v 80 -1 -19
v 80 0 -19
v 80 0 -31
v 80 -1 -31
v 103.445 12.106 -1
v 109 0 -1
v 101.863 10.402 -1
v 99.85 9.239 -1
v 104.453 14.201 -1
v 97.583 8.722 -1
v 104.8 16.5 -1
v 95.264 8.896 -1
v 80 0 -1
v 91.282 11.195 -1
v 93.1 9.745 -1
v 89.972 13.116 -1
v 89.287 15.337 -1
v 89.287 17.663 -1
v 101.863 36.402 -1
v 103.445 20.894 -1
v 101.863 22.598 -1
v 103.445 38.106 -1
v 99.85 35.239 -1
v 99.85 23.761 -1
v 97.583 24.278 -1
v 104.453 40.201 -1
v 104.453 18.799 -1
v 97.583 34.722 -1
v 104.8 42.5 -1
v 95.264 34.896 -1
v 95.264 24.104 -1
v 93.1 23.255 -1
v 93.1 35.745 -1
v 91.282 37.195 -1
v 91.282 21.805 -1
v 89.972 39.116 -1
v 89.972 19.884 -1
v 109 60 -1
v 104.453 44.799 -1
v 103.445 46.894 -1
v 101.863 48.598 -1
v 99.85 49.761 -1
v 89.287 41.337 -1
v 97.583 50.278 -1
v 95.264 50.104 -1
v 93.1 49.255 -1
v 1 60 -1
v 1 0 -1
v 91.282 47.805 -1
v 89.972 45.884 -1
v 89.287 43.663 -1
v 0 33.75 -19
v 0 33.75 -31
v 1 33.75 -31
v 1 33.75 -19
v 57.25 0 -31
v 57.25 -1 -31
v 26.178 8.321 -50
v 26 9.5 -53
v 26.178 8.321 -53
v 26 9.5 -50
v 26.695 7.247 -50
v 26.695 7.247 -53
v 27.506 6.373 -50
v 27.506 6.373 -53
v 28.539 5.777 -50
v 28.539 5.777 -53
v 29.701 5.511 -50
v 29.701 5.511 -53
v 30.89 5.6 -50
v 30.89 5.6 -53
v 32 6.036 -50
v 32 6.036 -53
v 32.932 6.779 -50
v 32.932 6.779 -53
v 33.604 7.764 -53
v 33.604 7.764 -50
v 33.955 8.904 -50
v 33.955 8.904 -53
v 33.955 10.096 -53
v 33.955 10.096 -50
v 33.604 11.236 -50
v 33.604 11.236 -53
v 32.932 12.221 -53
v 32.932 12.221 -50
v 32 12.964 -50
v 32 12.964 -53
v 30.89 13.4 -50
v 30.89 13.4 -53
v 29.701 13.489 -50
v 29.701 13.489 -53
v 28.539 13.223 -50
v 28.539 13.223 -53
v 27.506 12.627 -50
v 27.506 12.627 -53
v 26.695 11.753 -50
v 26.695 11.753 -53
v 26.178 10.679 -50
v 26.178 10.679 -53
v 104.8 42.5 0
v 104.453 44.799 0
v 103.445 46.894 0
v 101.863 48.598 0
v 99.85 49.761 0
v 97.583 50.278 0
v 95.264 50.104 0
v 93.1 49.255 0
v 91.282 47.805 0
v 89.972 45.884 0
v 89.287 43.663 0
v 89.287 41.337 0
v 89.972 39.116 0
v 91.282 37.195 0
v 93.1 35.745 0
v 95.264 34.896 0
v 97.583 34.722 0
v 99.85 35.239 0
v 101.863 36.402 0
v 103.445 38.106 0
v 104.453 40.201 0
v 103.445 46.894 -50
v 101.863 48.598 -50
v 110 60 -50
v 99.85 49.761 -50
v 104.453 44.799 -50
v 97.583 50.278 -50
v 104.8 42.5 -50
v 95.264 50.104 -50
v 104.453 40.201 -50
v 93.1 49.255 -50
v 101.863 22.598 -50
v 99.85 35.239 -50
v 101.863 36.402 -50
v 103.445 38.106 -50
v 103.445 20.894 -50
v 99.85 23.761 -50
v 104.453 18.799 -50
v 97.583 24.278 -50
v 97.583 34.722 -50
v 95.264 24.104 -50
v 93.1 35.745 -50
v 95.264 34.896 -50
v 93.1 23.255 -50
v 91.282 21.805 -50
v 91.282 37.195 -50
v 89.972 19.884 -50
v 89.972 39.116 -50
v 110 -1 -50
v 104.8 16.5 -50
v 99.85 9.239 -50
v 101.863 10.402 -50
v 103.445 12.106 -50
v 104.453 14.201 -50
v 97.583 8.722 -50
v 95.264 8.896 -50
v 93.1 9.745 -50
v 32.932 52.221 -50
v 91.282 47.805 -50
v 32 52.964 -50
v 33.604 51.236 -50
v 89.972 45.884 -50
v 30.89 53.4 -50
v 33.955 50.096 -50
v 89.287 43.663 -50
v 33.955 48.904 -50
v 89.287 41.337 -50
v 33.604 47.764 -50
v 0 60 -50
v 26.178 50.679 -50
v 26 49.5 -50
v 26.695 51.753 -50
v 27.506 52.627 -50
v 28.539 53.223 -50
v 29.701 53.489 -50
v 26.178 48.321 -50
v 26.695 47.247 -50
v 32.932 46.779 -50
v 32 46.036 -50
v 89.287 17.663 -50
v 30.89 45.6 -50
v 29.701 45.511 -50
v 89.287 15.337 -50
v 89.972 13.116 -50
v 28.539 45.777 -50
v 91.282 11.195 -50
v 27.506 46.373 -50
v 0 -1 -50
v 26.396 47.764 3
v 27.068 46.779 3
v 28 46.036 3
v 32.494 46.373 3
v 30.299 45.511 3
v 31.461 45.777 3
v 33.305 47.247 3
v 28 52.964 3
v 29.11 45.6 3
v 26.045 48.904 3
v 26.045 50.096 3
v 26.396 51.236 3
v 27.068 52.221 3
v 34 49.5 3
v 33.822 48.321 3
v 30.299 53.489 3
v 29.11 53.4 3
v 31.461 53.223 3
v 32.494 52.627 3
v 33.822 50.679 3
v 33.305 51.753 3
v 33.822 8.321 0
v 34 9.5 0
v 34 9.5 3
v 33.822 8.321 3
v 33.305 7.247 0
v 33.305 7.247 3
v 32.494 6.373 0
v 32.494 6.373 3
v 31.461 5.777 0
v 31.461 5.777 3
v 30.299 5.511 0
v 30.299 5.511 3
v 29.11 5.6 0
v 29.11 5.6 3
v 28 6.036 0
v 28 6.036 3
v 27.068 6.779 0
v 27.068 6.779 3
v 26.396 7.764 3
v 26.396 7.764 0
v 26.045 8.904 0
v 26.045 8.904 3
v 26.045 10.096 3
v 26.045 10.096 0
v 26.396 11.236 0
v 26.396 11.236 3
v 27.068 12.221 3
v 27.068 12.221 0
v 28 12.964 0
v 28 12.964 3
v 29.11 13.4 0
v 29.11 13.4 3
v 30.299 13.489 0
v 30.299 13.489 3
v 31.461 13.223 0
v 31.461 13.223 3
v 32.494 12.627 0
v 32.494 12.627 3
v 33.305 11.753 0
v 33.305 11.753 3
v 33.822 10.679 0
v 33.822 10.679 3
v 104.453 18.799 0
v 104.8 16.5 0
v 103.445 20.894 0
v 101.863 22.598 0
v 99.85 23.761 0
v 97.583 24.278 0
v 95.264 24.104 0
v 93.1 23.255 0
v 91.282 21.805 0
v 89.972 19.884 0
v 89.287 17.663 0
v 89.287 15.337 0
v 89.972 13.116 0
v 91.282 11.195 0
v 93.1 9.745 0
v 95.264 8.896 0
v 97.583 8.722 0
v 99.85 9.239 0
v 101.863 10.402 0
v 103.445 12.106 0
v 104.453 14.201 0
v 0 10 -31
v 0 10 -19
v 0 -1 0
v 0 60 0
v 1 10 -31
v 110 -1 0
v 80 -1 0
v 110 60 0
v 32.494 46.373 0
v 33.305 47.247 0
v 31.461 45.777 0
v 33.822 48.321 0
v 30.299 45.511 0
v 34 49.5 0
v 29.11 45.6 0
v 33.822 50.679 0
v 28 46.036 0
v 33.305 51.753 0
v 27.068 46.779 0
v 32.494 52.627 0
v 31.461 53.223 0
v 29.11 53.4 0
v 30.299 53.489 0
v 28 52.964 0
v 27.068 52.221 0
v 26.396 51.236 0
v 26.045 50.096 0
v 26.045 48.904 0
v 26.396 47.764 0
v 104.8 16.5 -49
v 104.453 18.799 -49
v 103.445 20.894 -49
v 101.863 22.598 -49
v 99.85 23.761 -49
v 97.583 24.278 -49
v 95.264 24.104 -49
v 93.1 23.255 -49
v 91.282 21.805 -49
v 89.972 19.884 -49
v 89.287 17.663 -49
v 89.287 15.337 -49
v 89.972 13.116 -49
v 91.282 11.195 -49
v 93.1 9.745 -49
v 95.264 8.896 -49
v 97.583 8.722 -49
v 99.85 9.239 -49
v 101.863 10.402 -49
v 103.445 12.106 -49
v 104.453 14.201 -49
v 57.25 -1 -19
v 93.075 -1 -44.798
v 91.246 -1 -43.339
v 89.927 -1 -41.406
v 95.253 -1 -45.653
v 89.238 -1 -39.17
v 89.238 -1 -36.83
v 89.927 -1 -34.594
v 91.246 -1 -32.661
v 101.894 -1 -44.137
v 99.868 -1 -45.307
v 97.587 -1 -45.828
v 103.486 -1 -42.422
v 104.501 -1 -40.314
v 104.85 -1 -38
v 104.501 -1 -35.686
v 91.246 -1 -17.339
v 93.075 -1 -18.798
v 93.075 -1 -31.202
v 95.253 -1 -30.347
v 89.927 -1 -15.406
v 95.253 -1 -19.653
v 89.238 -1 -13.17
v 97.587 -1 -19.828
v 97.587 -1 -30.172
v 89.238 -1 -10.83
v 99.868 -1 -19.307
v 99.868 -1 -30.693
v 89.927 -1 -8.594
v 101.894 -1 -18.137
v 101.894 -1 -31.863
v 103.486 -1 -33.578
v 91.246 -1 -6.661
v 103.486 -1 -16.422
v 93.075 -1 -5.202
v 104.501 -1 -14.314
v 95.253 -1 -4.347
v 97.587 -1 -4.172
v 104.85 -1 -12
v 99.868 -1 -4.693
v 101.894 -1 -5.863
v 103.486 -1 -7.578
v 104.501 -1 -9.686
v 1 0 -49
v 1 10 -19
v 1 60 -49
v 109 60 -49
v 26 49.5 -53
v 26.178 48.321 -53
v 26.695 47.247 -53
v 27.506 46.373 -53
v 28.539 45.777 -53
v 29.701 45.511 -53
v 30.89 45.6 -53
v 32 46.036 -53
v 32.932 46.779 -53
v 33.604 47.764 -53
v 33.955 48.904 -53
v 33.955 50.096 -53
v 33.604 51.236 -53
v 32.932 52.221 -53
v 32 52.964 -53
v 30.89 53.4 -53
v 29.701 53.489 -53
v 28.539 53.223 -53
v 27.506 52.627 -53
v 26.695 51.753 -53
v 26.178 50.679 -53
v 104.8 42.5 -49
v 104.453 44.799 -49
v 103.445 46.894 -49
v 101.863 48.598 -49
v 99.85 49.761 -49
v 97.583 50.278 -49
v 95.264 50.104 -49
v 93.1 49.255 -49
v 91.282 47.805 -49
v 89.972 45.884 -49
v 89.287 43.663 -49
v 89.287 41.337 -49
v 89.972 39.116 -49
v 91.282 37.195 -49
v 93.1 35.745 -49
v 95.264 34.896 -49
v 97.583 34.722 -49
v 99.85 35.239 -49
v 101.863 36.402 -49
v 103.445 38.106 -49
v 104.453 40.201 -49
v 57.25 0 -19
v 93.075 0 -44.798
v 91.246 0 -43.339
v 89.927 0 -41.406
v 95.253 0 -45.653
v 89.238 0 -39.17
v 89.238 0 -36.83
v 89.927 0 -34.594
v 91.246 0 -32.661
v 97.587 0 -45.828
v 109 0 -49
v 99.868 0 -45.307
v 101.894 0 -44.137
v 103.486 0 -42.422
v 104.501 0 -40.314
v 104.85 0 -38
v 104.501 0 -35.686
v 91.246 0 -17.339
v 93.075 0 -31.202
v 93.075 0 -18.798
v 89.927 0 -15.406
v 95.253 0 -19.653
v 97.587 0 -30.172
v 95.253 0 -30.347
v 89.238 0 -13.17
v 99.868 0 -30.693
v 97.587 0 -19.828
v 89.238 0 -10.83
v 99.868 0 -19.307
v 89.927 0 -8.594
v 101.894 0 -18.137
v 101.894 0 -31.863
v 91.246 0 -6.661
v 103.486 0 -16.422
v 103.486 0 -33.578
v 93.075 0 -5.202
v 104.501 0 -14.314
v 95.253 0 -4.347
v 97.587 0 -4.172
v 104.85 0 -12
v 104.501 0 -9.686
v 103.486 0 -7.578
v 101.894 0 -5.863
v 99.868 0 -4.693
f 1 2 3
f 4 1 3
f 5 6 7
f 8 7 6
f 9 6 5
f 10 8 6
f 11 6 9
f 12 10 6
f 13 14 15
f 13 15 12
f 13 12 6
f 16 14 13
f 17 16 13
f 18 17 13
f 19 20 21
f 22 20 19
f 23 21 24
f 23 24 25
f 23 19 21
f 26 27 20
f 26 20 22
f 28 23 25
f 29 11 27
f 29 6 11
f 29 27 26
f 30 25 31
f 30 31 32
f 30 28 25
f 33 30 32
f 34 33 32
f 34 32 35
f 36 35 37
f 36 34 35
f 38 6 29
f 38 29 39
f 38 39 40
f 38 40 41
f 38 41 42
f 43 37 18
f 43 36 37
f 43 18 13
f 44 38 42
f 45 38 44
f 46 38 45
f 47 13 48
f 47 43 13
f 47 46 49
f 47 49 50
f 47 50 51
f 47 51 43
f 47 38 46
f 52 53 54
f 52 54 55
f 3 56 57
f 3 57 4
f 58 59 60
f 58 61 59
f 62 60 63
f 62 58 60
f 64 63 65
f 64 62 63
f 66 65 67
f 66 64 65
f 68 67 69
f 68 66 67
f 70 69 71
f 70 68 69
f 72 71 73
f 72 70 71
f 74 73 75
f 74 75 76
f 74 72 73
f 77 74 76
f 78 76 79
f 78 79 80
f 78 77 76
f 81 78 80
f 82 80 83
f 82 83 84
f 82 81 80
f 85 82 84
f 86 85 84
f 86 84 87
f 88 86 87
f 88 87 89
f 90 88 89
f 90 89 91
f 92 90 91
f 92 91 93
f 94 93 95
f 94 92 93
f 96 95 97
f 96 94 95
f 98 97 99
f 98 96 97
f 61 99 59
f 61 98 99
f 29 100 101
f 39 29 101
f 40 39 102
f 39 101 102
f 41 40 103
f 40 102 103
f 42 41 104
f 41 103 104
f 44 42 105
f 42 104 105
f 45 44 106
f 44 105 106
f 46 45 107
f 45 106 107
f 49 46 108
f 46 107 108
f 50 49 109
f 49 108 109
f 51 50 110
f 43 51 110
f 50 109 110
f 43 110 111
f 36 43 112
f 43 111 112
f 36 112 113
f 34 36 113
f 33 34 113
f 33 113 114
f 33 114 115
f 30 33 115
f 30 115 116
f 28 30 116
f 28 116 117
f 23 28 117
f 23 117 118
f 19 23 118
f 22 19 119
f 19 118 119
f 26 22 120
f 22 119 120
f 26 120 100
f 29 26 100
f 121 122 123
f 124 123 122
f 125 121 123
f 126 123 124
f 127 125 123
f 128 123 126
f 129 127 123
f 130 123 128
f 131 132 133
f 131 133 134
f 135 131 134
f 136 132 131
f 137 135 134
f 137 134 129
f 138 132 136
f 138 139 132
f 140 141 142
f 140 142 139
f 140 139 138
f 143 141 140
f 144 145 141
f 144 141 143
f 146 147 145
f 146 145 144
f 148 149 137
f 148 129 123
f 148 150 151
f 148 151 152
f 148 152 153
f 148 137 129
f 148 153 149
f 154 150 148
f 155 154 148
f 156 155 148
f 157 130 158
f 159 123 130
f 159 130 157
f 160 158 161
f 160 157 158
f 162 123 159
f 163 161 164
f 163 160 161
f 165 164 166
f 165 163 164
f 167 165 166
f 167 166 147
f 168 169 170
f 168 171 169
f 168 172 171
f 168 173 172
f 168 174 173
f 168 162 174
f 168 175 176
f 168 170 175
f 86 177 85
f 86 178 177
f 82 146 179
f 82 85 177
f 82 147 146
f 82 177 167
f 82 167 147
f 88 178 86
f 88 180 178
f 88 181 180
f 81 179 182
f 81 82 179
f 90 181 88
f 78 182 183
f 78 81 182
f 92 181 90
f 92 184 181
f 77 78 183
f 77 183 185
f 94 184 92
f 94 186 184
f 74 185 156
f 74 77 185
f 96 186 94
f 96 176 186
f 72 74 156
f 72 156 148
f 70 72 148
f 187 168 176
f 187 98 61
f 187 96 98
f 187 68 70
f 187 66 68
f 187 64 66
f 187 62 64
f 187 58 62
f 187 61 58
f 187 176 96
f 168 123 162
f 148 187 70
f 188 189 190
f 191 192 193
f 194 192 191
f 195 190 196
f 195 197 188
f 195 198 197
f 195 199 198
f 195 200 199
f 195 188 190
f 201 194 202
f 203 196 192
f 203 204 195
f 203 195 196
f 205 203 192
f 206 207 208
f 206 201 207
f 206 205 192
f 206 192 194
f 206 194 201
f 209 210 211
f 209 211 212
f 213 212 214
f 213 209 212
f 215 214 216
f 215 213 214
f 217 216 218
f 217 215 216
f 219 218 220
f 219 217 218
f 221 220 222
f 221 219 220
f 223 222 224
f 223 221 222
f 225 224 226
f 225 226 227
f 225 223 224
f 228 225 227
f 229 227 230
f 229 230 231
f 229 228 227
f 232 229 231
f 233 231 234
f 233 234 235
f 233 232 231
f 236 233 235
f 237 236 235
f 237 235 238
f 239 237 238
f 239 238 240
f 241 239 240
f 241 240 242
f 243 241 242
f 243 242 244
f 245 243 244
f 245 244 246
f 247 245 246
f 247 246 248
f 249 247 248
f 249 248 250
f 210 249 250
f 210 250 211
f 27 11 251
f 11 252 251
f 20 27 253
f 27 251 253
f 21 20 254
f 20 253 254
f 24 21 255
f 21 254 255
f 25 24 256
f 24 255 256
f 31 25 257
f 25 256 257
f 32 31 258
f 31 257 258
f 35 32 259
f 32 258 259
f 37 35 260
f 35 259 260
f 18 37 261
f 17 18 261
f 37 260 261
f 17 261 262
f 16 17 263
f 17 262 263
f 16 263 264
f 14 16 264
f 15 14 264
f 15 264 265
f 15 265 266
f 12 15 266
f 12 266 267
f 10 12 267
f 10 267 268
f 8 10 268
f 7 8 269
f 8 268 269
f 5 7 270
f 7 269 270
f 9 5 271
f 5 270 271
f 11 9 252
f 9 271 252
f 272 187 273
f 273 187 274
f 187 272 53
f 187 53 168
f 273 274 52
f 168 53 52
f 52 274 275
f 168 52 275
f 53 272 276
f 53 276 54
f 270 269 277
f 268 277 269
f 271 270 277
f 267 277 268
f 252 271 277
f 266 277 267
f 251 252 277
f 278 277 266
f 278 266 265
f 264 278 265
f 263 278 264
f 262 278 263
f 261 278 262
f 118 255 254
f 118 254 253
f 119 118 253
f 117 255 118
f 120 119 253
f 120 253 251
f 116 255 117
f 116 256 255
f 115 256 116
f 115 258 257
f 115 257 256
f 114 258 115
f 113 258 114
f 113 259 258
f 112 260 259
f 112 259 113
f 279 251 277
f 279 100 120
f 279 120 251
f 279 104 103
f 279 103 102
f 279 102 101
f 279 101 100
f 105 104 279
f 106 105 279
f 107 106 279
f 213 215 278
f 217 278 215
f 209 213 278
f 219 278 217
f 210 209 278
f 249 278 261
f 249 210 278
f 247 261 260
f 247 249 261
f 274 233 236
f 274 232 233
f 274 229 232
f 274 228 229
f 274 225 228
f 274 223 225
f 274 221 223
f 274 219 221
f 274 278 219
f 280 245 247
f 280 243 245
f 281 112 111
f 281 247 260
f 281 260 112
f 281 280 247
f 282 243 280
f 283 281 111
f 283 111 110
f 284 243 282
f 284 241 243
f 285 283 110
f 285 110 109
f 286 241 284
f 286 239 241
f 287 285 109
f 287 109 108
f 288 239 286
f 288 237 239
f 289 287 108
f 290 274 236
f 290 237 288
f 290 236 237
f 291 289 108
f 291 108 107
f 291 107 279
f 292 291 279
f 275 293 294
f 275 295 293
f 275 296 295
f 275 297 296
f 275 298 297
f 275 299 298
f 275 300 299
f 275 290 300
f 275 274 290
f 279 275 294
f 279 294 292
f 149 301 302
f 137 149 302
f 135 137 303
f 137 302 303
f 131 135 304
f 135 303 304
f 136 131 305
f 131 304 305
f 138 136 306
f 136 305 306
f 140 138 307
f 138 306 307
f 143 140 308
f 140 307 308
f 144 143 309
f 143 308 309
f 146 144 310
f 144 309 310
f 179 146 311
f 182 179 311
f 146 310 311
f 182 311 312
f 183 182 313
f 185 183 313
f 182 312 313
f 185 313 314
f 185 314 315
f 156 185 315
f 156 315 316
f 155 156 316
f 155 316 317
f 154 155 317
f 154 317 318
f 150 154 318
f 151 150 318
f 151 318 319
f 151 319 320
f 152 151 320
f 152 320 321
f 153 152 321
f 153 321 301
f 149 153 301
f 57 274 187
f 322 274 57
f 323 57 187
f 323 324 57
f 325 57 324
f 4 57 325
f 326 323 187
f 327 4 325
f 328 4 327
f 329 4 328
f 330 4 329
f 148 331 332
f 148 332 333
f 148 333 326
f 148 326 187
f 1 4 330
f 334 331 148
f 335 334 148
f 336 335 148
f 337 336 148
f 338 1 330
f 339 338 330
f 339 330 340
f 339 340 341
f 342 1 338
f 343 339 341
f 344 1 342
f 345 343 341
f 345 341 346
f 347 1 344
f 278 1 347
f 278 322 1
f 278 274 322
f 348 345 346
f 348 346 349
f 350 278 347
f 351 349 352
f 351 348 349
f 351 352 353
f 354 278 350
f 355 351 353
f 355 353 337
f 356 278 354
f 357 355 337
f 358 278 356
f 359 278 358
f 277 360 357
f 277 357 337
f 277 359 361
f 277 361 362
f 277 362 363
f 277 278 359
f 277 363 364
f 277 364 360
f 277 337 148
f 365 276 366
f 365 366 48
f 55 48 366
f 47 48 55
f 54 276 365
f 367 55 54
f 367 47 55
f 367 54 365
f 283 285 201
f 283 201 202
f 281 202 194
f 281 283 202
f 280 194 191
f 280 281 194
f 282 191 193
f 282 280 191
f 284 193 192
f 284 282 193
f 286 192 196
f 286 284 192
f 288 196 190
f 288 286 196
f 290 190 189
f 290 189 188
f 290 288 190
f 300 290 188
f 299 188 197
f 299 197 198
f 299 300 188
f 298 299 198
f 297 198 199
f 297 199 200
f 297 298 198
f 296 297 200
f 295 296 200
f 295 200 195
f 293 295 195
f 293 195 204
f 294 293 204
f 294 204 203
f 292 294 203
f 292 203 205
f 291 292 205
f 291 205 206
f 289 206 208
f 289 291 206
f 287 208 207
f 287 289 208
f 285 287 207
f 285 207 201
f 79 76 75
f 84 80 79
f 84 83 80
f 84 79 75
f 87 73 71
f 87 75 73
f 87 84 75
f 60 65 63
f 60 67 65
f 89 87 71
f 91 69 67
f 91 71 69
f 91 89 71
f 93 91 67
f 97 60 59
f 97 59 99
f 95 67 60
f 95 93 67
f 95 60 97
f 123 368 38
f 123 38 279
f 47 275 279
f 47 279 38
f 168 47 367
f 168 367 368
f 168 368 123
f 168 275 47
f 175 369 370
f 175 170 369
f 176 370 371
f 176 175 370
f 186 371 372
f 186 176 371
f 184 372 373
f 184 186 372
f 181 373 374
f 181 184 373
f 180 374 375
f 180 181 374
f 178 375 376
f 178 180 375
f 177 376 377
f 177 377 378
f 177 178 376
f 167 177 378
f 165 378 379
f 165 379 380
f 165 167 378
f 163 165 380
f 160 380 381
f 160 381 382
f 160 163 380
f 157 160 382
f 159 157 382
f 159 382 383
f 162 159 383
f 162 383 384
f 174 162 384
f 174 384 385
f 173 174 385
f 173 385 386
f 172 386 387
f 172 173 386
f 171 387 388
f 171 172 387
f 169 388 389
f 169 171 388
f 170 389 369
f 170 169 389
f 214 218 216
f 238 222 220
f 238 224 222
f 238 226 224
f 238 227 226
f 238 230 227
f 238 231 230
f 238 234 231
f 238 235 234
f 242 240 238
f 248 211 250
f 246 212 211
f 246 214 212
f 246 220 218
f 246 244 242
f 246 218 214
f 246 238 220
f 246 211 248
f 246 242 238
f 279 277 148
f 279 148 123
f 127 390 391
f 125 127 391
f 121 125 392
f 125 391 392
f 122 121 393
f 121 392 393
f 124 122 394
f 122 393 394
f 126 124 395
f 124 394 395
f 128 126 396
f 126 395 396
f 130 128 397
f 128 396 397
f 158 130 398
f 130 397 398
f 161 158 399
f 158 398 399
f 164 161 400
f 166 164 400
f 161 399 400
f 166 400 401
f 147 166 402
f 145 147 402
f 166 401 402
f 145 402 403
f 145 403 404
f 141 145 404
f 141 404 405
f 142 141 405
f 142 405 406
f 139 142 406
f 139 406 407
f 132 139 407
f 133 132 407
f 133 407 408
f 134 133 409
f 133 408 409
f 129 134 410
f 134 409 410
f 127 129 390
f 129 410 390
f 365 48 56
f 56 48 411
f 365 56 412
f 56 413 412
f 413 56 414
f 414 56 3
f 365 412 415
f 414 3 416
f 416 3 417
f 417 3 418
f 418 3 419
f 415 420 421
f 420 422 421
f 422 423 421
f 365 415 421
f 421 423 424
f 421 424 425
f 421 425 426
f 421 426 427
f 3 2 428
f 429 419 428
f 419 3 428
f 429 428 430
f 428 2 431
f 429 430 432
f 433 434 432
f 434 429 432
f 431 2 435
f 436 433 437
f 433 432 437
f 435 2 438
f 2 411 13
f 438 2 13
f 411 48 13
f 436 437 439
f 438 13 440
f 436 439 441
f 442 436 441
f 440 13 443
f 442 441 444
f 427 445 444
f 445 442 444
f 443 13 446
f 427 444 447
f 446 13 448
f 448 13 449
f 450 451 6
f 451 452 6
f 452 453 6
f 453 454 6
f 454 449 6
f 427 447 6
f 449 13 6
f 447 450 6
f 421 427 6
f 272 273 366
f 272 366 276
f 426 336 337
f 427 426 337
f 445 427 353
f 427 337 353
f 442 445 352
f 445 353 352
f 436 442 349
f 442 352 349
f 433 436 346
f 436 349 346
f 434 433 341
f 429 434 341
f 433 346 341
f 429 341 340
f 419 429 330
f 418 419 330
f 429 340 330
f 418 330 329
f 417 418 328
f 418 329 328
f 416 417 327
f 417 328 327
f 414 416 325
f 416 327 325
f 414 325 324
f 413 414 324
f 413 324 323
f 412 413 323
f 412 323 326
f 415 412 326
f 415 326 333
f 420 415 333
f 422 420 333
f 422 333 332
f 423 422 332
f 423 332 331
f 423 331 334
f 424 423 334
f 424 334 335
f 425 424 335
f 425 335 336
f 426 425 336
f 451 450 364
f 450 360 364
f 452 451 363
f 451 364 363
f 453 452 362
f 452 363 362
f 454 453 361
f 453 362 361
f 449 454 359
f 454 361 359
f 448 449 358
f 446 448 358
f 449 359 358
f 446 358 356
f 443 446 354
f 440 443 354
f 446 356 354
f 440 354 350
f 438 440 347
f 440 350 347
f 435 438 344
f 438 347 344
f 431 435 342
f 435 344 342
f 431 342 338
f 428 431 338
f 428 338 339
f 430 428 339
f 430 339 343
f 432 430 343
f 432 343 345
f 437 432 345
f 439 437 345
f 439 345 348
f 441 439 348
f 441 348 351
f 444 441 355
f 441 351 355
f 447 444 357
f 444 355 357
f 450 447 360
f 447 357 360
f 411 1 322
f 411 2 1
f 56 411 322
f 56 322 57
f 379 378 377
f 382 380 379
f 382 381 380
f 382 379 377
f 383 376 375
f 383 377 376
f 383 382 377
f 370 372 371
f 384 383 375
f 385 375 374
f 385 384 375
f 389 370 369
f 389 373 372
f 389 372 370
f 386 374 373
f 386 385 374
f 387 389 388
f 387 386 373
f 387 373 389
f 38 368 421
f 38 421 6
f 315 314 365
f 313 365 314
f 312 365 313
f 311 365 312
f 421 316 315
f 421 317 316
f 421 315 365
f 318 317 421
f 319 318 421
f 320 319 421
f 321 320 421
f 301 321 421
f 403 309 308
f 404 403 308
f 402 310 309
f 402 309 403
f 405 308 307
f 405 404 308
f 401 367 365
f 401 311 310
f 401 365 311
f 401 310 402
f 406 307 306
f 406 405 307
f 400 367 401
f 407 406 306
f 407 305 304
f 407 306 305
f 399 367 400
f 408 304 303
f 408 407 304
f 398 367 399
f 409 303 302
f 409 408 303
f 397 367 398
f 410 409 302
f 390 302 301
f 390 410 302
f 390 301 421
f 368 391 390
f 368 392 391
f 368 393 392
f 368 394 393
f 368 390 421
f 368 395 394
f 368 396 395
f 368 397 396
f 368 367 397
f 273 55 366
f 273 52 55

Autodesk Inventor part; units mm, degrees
ref_plane "YZ Plane" through (0, 0, 0) normal (1, 0, 0) x (0, 1, 0)
ref_plane "XZ Plane" through (0, 0, 0) normal (0, 1, 0) x (-1, 0, 0)
ref_plane "XY Plane" through (0, 0, 0) normal (0, 0, 1) x (1, 0, 0)
sketch "Esquisse1" plane through (0, 0, 0) normal (1, 0, 0) x (0, 1, 0)
  line L0 (0, 0) -> (60, 0)
  line L1 (60, 0) -> (60, -50)
  line L2 (60, -50) -> (0, -50)
  line L3 (0, -50) -> (0, 0)
  dimension "d0" = 60
  dimension "d1" = 50
extrude "Extrusion1" add sketch "Esquisse1" along normal blind 110
shell "Coque1" thickness 1 removed faces 1 at (36.6667, 0, -33.3333)
sketch "Esquisse2" plane through (0, 0, -50) normal (0, -1, 0) x (1, 0, 0)
  line L0 (0, 50) -> (110, 50) projected
  line L1 (110, 0) -> (110, 50) projected
  line L2 (110, 50) -> (110, 0)
  line L3 (110, 25) -> (110, 19)
  line L4 (110, 25) -> (110, 31)
  line L5 (0, 50) -> (0, 0) projected
  line L6 (84, 19) -> (61.25, 19)
  line L7 (84, 31) -> (61.25, 31)
  line L8 (110, 50) -> (0, 50)
  line L9 (0, 50) -> (0, 0)
  line L10 (0, 0) -> (110, 0) projected
  line L11 (0, 0) -> (110, 0)
  line L12 (109, 49) -> (109, 1) projected
  line L13 (110, 31) -> (110, 19)
  line L14 (110, 50) -> (110, 0) projected
  line L15 (61.25, 31) -> (57.25, 31)
  line L16 (57.25, 31) -> (57.25, 19)
  line L17 (82.25, 19) -> (86.25, 19)
  line L18 (109, 31) -> (105, 31)
  line L19 (80, 31) -> (80, 19)
  line L20 (1, 49) -> (109, 49) projected
  line L21 (57.25, 19) -> (61.25, 19)
  line L22 (110, 50) -> (80, 50)
  line L23 (0, 50) -> (110, 50) projected
  line L24 (80, 31) -> (80, 50)
  dimension "d5" = 6
  dimension "d6" = 6
  dimension "d7" = 48.75
  dimension "d50" = 4
  dimension "d67" = 30
extrude "Extrusion2" add sketch "Esquisse2" along normal blind 1
sketch "Esquisse3" plane through (0, 0, 0) normal (-1, 0, 0) x (0, 0, 1)
  line L0 (0, 0) -> (-19, 0)
  line L1 (-19, 0) -> (-19, 10)
  line L2 (-19, 10) -> (-31, 10)
  line L3 (-31, 10) -> (-31, 33.75)
  line L4 (-31, 33.75) -> (-19, 33.75)
  line L5 (-19, 33.75) -> (-19, 10)
  dimension "d10" = 10
  dimension "d11" = 12
  dimension "d12" = 23.75
extrude "Extrusion3" cut sketch "Esquisse3" against normal blind 1
sketch "Esquisse4" plane through (110, 60, -50) normal (0, 0, -1) x (-1, 0, 0)
  line L0 (110, -61) -> (110, 0) projected
  line L1 (110, -61) -> (100, -61)
  line L2 (0, -61) -> (110, -61) projected
  line L3 (110, 0) -> (0, 0) projected
  circle A0 centre (80, -50.5) radius 4
  line L4 (110, 0) -> (0, 0) projected
  circle A1 centre (80, -10.5) radius 4
  line L5 (110, 0) -> (80, 0)
  line L6 (80, -10.5) -> (80, -50.5)
  line L7 (80, -50.5) -> (80, -61)
  point P0 (110, -60)
  dimension "d15" = 10
  dimension "d28" = 8
  dimension "d48" = 8
  dimension "d65" = 30
  dimension "d69" = 40
  dimension "d70" = 10.5
extrude "Extrusion4" add sketch "Esquisse4" along normal blind 3
sketch "Esquisse8" plane through (0, 60, 0) normal (0, 0, 1) x (1, 0, 0)
  circle A0 centre (30, -10.5) radius 4
  line L0 (110, -61) -> (0, -61) projected
  circle A1 centre (30, -50.5) radius 4 projected
  circle A2 centre (30, -50.5) radius 4
  line L1 (30, -21.5) -> (30, -14.5)
  line L2 (30, -44.5) -> (30, -46.5)
  line L3 (0, -61) -> (0, 0) projected
  line L4 (0, 0) -> (30, 0)
  line L5 (0, 0) -> (110, 0) projected
  line L6 (30, -50.5) -> (30, -10.5)
  line L7 (1, -1) -> (109, -1) projected
  line L8 (30, -10.5) -> (30, 0)
  line L9 (30, -50.5) -> (30, -61)
  point P0 (0, -60)
  point P1 (30, -6.5)
  dimension "d74" = 8
  dimension "d40" = 8
  dimension "d66" = 30
  dimension "d73" = 40
extrude "Extrusion8" add sketch "Esquisse8" along normal blind 3 contours L6 L8 A0 | A0 L8 L6 | L6 L9 A1 | A1 L9 L6
sketch "Esquisse6" plane through (0, 60, 0) normal (0, 1, 0) x (1, 0, 0)
  line L0 (1, 49) -> (109, 49) projected
  line L1 (1, 1) -> (1, 49)
  line L2 (1, 49) -> (109, 49)
  line L3 (109, 49) -> (109, 1)
  line L4 (109, 1) -> (1, 1)
  line L5 (110, 0) -> (0, 0) projected
extrude "Extrusion6" cut sketch "Esquisse6" against normal blind 10
sketch "Esquisse12" plane through (0, 60, 0) normal (0, 0, 1) x (1, 0, 0)
  line L0 (110, 0) -> (110, -61) projected
  line L1 (110, 0) -> (97, 0)
  line L2 (1, 0) -> (109, 0) projected
  line L3 (97, 0) -> (97, -17.5)
  circle A0 centre (97, -17.5) radius 7.8
  line L4 (97, -17.5) -> (97, -43.5)
  circle A1 centre (97, -43.5) radius 7.8
  point P0 (0, -60)
  dimension "d51" = 13
  dimension "d52" = 17.5
  dimension "d53" = 15.6
  dimension "d54" = 26
  dimension "d55" = 15.6
extrude "Extrusion9" cut sketch "Esquisse12" against normal through all
sketch "Esquisse13" plane through (0, -1, -50) normal (0, -1, 0) x (1, 0, 0)
  line L0 (0, 0) -> (110, 0) projected
  line L1 (110, 0) -> (97, 0)
  line L2 (97, 0) -> (97, 12)
  line L3 (97, 12) -> (97, 38)
  line L4 (97, 38) -> (97, 50)
  circle A0 centre (97, 38) radius 7.85
  circle A1 centre (97, 12) radius 7.85
  point P0 (0, 50)
  dimension "d58" = 13
  dimension "d59" = 12
  dimension "d60" = 26
  dimension "d61" = 15.7
  dimension "d62" = 15.7
extrude "Extrusion10" cut sketch "Esquisse13" against normal blind 10
properties part number "Torse"
